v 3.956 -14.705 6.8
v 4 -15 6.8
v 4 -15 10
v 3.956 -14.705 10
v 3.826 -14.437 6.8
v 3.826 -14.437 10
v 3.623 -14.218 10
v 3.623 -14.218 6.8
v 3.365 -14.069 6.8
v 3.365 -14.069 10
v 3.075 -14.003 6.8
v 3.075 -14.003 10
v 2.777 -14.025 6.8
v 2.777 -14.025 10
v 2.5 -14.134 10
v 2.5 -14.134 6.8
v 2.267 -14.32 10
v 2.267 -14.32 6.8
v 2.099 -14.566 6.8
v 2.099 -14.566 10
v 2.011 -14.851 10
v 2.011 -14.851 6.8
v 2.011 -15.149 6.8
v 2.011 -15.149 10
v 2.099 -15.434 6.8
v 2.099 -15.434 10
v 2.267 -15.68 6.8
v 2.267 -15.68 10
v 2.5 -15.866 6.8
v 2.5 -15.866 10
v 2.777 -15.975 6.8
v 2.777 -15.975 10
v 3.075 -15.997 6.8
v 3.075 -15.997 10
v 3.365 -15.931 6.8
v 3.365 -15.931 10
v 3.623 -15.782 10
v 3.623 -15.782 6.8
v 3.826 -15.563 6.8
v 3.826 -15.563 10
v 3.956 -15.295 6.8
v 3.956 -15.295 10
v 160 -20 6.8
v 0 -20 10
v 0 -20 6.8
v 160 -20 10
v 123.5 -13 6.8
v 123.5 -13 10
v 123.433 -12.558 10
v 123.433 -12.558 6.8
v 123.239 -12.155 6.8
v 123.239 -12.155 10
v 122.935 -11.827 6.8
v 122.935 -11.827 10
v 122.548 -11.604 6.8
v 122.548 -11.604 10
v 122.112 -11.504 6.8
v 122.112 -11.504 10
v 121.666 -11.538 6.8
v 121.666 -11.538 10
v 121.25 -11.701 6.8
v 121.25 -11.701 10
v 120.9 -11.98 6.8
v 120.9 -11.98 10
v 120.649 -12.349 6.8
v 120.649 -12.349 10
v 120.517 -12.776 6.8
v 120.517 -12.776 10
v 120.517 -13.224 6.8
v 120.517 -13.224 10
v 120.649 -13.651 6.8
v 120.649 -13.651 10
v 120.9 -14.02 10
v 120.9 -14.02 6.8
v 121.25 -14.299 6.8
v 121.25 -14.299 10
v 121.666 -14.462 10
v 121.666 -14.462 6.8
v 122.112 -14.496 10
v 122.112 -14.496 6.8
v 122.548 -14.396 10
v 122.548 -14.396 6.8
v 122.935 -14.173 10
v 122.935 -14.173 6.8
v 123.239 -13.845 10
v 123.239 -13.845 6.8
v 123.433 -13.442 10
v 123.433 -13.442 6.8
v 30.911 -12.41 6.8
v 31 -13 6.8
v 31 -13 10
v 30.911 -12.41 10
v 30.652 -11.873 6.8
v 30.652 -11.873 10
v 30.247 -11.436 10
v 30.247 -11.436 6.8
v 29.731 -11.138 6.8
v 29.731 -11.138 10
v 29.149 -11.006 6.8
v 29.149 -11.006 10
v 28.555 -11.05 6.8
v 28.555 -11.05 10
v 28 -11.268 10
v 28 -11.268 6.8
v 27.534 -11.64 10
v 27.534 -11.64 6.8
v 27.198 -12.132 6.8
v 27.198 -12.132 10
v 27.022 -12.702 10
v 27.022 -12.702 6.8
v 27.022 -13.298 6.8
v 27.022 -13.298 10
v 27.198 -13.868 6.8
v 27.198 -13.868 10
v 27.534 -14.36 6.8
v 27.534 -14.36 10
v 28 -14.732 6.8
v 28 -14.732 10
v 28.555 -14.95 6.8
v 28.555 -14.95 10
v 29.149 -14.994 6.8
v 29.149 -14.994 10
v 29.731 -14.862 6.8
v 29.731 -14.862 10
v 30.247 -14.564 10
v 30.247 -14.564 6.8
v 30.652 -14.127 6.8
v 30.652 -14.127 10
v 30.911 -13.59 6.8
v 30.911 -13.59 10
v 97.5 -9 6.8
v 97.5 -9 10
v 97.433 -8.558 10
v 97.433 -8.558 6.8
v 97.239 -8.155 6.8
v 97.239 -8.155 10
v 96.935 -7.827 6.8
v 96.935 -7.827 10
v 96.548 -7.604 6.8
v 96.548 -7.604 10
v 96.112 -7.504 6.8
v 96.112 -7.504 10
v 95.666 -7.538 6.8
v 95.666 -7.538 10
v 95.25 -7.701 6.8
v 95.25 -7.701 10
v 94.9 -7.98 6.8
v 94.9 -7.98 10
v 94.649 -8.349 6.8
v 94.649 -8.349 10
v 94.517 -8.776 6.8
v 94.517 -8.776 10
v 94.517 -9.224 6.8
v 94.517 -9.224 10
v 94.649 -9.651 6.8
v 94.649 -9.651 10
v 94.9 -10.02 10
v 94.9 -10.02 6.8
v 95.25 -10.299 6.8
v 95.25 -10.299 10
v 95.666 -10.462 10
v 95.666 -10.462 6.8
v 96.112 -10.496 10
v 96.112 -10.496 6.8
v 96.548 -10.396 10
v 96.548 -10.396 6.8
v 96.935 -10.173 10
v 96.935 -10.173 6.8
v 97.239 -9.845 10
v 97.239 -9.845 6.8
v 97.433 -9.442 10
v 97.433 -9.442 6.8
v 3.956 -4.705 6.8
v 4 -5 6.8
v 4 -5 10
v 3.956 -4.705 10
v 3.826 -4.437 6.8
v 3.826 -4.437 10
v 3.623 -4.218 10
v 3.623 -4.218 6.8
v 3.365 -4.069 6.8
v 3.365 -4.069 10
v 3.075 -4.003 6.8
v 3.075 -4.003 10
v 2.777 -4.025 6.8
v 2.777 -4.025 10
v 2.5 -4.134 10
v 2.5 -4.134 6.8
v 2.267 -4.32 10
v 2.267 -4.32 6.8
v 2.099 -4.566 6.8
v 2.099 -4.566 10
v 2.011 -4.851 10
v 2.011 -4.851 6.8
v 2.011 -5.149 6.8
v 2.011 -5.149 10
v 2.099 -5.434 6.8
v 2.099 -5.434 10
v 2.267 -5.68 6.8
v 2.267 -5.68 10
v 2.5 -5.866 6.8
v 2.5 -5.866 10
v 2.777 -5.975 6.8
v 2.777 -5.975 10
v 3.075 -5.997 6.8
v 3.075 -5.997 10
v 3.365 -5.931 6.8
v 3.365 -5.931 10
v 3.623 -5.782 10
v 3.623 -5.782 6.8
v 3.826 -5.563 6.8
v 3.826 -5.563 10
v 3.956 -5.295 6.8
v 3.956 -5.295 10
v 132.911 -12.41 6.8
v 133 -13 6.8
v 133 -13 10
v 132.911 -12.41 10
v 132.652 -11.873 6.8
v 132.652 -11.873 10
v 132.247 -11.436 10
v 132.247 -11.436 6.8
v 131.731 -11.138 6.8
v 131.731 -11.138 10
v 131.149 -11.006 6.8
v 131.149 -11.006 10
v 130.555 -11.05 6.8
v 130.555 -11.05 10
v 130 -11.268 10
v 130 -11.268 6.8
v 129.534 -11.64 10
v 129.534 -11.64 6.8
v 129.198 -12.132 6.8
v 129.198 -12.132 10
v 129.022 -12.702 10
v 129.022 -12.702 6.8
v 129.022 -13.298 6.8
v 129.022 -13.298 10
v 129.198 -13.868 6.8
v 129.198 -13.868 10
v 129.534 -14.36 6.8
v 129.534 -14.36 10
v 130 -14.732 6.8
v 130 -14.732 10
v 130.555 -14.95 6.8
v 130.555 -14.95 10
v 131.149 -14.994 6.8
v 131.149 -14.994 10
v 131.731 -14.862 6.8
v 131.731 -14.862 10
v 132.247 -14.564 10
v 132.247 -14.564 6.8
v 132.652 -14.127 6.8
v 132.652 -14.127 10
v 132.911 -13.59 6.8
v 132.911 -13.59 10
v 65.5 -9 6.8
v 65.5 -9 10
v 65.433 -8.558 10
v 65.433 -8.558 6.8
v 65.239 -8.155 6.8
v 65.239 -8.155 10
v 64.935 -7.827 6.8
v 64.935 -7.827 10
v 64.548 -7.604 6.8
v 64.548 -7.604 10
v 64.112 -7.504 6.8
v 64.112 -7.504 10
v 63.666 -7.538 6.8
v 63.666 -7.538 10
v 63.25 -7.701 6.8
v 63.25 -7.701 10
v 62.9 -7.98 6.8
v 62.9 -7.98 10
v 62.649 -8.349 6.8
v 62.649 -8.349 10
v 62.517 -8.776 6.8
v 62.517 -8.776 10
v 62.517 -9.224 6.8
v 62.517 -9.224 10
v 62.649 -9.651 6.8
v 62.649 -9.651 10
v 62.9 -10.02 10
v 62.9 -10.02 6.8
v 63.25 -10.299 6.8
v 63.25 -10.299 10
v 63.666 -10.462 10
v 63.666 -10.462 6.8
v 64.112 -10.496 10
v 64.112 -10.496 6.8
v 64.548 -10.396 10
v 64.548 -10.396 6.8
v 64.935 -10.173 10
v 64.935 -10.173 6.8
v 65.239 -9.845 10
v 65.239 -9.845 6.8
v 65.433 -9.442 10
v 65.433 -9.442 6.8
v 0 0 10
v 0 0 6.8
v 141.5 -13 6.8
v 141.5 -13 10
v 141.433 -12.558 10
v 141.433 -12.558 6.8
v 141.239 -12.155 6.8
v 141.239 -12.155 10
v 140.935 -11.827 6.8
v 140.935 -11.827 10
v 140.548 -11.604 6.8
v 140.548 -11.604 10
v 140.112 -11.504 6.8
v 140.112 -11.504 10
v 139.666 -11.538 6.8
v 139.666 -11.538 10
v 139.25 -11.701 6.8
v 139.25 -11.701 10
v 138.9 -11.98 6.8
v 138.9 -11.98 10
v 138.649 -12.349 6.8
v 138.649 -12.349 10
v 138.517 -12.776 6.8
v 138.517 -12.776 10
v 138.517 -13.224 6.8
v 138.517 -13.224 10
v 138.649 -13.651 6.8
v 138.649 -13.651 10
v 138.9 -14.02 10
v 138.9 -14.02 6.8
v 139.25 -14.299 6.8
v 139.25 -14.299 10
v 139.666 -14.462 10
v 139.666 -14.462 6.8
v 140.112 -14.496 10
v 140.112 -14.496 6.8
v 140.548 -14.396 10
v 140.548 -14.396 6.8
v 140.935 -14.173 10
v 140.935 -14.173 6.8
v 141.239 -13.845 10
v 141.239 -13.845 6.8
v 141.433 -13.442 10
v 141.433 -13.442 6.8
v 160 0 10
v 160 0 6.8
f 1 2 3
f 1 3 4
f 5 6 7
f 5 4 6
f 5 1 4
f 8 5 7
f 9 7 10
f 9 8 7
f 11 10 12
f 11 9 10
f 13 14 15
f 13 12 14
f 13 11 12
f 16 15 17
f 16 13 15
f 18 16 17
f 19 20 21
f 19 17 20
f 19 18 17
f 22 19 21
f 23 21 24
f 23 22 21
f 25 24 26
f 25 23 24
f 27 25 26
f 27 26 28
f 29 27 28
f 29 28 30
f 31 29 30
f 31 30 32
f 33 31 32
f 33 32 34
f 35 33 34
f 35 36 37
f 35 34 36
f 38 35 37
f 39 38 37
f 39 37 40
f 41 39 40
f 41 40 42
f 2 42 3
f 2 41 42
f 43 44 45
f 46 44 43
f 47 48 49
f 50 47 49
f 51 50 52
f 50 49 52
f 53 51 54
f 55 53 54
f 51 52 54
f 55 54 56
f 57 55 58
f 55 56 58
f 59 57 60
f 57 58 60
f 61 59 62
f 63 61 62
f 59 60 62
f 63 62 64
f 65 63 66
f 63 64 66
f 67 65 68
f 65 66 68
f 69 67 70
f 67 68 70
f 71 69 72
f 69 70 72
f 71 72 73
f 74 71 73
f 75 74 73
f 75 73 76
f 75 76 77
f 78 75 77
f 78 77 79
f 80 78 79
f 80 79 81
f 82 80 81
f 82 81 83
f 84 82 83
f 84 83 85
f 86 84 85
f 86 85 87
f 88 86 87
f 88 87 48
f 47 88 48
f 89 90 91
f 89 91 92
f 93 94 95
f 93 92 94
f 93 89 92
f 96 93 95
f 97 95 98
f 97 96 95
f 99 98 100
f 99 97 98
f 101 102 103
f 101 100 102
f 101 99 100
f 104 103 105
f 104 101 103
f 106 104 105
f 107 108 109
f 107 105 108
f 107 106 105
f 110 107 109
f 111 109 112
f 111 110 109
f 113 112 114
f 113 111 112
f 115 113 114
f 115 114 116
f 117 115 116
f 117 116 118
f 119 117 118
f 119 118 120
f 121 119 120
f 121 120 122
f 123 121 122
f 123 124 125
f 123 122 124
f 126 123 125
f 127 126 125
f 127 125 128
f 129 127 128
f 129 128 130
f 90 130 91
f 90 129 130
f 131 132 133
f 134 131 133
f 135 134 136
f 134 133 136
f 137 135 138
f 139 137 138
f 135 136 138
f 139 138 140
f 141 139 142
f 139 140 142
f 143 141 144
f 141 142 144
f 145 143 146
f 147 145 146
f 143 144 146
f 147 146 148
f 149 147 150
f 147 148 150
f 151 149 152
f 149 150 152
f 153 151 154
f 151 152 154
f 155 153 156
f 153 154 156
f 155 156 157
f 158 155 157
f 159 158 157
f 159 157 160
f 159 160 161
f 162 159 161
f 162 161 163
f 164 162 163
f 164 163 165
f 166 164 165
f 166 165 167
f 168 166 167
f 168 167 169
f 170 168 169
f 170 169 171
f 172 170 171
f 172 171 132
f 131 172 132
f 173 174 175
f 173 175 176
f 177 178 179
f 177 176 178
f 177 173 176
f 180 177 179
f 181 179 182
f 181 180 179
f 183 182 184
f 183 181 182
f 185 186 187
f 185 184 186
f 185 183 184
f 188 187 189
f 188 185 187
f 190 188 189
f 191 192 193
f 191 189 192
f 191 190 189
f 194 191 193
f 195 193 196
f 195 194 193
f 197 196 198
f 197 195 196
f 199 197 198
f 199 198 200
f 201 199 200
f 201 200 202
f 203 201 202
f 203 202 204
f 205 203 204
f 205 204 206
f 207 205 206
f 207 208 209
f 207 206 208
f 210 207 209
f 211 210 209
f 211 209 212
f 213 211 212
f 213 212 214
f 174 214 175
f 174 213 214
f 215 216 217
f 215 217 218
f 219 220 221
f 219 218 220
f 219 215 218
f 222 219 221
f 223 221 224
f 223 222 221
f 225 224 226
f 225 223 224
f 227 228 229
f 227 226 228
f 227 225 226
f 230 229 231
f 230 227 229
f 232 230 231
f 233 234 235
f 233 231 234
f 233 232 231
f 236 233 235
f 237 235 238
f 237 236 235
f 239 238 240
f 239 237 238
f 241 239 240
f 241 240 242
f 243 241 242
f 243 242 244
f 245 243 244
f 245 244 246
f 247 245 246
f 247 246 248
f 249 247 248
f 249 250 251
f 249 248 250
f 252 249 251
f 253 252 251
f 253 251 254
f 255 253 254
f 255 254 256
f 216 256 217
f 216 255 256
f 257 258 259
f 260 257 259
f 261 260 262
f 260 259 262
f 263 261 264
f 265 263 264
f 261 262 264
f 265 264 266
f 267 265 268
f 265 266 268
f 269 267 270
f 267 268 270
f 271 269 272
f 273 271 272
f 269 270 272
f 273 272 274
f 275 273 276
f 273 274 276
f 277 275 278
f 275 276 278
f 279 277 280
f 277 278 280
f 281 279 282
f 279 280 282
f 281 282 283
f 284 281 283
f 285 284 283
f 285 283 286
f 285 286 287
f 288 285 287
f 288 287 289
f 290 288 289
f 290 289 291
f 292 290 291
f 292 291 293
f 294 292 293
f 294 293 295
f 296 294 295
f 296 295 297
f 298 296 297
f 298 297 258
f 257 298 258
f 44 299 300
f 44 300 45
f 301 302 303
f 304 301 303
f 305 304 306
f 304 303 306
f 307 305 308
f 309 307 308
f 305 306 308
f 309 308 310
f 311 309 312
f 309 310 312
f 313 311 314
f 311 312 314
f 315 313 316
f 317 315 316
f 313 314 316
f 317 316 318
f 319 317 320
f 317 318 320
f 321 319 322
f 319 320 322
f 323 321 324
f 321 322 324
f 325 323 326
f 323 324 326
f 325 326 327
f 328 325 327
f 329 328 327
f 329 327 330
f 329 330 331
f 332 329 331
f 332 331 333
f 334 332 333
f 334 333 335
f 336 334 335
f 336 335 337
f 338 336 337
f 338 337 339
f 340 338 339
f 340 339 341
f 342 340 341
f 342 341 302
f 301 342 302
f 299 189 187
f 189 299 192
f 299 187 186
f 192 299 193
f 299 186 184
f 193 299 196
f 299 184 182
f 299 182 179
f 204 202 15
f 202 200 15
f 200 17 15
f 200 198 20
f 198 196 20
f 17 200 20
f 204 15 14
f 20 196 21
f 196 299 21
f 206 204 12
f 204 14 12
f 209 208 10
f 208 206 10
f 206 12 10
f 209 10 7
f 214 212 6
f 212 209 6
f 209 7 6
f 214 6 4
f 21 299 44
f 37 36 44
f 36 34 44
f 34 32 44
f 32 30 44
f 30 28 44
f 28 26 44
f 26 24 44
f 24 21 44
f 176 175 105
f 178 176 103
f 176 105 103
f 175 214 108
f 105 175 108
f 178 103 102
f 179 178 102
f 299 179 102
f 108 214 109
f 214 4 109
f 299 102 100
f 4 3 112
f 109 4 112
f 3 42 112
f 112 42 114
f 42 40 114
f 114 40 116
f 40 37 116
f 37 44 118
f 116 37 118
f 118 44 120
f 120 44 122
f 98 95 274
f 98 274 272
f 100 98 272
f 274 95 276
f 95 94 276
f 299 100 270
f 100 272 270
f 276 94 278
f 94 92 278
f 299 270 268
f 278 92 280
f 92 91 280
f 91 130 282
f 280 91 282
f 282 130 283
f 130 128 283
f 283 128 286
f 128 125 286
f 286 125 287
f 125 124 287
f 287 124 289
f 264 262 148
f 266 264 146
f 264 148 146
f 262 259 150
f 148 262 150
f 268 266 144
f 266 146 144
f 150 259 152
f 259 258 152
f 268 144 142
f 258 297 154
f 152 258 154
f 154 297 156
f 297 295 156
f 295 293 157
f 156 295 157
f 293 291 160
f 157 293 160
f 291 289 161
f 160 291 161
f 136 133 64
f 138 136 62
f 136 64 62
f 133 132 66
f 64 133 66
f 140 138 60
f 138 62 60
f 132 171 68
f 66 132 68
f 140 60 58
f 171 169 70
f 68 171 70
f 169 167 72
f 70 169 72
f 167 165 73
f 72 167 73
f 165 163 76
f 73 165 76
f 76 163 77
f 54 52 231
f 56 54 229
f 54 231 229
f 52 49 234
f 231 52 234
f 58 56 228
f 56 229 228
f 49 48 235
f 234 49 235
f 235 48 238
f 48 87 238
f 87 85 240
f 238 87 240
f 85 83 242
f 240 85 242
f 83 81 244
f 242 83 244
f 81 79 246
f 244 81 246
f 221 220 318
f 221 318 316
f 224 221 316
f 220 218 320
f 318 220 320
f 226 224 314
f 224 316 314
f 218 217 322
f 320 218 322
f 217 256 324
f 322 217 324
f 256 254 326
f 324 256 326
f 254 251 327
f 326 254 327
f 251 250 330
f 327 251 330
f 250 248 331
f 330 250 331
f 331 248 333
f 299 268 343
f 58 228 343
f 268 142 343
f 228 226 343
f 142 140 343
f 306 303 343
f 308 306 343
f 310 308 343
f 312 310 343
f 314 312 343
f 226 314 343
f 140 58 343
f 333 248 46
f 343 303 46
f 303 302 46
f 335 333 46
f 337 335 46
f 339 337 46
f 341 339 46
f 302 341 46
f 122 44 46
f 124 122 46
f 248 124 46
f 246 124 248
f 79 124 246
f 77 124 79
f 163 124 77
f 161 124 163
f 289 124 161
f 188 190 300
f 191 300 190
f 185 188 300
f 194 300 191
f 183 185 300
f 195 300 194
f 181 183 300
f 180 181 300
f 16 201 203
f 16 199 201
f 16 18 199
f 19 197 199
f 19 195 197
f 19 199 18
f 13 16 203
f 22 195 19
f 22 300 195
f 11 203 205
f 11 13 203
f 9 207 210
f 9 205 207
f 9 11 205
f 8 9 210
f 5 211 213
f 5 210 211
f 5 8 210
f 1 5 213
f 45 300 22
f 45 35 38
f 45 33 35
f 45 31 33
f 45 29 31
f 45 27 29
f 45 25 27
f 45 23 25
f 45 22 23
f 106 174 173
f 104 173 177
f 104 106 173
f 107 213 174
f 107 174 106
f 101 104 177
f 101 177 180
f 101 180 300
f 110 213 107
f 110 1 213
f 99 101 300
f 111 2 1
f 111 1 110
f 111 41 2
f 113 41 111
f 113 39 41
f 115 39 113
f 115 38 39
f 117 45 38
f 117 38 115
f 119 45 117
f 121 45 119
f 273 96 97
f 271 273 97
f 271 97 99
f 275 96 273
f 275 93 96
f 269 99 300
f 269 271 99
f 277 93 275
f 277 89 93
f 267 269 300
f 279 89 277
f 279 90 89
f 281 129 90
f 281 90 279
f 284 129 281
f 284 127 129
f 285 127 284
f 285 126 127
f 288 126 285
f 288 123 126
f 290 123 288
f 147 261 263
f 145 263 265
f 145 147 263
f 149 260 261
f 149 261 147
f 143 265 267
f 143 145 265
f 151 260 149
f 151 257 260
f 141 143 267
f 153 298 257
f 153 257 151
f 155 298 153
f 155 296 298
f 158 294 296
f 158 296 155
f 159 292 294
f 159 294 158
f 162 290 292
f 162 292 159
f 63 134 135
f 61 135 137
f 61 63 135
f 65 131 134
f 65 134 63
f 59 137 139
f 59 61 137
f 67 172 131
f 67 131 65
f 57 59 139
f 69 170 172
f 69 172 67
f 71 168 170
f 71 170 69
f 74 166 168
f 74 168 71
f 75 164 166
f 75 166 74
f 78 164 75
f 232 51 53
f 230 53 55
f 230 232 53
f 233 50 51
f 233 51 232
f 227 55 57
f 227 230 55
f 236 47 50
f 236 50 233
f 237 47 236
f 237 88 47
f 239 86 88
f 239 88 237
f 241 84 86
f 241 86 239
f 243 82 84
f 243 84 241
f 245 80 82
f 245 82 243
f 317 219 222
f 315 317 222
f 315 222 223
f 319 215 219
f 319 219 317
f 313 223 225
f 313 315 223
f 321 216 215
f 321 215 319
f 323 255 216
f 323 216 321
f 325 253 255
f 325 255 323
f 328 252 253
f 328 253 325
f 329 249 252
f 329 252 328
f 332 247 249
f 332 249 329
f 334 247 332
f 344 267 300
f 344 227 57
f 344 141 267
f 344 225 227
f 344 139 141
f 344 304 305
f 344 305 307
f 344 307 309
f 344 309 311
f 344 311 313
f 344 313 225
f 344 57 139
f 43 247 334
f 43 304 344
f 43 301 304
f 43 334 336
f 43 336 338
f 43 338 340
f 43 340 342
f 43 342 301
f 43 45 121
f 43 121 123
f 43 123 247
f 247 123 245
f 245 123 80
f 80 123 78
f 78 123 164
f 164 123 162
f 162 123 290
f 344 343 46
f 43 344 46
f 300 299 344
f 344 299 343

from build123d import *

# Parameters (mm, degrees)
SKETCH2_W               = 160
SKETCH2_H               = 20
BOSS_EXTRUDE1_DEPTH     = 3.2
CUT_EXTRUDE1_DEPTH      = 162.276904732
CUT_EXTRUDE1_DEPTH_BACK = 162.276904732
SKETCH5_R               = 2
SKETCH6_R               = 1.5
CUT_EXTRUDE2_DEPTH      = 10
CUT_EXTRUDE3_DEPTH      = 162.276904732
CUT_EXTRUDE3_DEPTH_BACK = 162.276904732
SKETCH7_R               = 1
SKETCH8_R               = 1.5
CUT_EXTRUDE4_DEPTH      = 10


with BuildPart() as part:
    # Sketch2 → Boss-Extrude1 (new body)
    with BuildSketch(Plane(origin=(0, -10, 10), x_dir=(1, 0, 0), z_dir=(0, 0, -1))):
        with Locations((80, 0)):
            Rectangle(SKETCH2_W, SKETCH2_H)
    extrude(amount=BOSS_EXTRUDE1_DEPTH)

    # Sketch5 → Cut-Extrude1 (cut, two sides: drawn at the far end of the back side and taken through both)
    with BuildSketch(Plane.XY.offset(10).offset(-CUT_EXTRUDE1_DEPTH_BACK)):
        with Locations((131, -13)):
            Circle(SKETCH5_R)
        with Locations((29, -13)):
            Circle(SKETCH5_R)
    extrude(amount=CUT_EXTRUDE1_DEPTH + CUT_EXTRUDE1_DEPTH_BACK, mode=Mode.SUBTRACT)

    # Sketch6 → Cut-Extrude2 (cut)
    with BuildSketch(Plane.XY.offset(10)):
        with Locations((64, -9)):
            Circle(SKETCH6_R)
        with Locations((96, -9)):
            Circle(SKETCH6_R)
    extrude(amount=-CUT_EXTRUDE2_DEPTH, mode=Mode.SUBTRACT)

    # Sketch7 → Cut-Extrude3 (cut, two sides: drawn at the far end of the back side and taken through both)
    with BuildSketch(Plane.XY.offset(10).offset(-CUT_EXTRUDE3_DEPTH_BACK)):
        with Locations((3, -15)):
            Circle(SKETCH7_R)
        with Locations((3, -5)):
            Circle(SKETCH7_R)
    extrude(amount=CUT_EXTRUDE3_DEPTH + CUT_EXTRUDE3_DEPTH_BACK, mode=Mode.SUBTRACT)

    # Sketch8 → Cut-Extrude4 (cut)
    with BuildSketch(Plane.XY.offset(10)):
        with Locations((140, -13)):
            Circle(SKETCH8_R)
        with Locations((122, -13)):
            Circle(SKETCH8_R)
    extrude(amount=-CUT_EXTRUDE4_DEPTH, mode=Mode.SUBTRACT)


solid = part.part
